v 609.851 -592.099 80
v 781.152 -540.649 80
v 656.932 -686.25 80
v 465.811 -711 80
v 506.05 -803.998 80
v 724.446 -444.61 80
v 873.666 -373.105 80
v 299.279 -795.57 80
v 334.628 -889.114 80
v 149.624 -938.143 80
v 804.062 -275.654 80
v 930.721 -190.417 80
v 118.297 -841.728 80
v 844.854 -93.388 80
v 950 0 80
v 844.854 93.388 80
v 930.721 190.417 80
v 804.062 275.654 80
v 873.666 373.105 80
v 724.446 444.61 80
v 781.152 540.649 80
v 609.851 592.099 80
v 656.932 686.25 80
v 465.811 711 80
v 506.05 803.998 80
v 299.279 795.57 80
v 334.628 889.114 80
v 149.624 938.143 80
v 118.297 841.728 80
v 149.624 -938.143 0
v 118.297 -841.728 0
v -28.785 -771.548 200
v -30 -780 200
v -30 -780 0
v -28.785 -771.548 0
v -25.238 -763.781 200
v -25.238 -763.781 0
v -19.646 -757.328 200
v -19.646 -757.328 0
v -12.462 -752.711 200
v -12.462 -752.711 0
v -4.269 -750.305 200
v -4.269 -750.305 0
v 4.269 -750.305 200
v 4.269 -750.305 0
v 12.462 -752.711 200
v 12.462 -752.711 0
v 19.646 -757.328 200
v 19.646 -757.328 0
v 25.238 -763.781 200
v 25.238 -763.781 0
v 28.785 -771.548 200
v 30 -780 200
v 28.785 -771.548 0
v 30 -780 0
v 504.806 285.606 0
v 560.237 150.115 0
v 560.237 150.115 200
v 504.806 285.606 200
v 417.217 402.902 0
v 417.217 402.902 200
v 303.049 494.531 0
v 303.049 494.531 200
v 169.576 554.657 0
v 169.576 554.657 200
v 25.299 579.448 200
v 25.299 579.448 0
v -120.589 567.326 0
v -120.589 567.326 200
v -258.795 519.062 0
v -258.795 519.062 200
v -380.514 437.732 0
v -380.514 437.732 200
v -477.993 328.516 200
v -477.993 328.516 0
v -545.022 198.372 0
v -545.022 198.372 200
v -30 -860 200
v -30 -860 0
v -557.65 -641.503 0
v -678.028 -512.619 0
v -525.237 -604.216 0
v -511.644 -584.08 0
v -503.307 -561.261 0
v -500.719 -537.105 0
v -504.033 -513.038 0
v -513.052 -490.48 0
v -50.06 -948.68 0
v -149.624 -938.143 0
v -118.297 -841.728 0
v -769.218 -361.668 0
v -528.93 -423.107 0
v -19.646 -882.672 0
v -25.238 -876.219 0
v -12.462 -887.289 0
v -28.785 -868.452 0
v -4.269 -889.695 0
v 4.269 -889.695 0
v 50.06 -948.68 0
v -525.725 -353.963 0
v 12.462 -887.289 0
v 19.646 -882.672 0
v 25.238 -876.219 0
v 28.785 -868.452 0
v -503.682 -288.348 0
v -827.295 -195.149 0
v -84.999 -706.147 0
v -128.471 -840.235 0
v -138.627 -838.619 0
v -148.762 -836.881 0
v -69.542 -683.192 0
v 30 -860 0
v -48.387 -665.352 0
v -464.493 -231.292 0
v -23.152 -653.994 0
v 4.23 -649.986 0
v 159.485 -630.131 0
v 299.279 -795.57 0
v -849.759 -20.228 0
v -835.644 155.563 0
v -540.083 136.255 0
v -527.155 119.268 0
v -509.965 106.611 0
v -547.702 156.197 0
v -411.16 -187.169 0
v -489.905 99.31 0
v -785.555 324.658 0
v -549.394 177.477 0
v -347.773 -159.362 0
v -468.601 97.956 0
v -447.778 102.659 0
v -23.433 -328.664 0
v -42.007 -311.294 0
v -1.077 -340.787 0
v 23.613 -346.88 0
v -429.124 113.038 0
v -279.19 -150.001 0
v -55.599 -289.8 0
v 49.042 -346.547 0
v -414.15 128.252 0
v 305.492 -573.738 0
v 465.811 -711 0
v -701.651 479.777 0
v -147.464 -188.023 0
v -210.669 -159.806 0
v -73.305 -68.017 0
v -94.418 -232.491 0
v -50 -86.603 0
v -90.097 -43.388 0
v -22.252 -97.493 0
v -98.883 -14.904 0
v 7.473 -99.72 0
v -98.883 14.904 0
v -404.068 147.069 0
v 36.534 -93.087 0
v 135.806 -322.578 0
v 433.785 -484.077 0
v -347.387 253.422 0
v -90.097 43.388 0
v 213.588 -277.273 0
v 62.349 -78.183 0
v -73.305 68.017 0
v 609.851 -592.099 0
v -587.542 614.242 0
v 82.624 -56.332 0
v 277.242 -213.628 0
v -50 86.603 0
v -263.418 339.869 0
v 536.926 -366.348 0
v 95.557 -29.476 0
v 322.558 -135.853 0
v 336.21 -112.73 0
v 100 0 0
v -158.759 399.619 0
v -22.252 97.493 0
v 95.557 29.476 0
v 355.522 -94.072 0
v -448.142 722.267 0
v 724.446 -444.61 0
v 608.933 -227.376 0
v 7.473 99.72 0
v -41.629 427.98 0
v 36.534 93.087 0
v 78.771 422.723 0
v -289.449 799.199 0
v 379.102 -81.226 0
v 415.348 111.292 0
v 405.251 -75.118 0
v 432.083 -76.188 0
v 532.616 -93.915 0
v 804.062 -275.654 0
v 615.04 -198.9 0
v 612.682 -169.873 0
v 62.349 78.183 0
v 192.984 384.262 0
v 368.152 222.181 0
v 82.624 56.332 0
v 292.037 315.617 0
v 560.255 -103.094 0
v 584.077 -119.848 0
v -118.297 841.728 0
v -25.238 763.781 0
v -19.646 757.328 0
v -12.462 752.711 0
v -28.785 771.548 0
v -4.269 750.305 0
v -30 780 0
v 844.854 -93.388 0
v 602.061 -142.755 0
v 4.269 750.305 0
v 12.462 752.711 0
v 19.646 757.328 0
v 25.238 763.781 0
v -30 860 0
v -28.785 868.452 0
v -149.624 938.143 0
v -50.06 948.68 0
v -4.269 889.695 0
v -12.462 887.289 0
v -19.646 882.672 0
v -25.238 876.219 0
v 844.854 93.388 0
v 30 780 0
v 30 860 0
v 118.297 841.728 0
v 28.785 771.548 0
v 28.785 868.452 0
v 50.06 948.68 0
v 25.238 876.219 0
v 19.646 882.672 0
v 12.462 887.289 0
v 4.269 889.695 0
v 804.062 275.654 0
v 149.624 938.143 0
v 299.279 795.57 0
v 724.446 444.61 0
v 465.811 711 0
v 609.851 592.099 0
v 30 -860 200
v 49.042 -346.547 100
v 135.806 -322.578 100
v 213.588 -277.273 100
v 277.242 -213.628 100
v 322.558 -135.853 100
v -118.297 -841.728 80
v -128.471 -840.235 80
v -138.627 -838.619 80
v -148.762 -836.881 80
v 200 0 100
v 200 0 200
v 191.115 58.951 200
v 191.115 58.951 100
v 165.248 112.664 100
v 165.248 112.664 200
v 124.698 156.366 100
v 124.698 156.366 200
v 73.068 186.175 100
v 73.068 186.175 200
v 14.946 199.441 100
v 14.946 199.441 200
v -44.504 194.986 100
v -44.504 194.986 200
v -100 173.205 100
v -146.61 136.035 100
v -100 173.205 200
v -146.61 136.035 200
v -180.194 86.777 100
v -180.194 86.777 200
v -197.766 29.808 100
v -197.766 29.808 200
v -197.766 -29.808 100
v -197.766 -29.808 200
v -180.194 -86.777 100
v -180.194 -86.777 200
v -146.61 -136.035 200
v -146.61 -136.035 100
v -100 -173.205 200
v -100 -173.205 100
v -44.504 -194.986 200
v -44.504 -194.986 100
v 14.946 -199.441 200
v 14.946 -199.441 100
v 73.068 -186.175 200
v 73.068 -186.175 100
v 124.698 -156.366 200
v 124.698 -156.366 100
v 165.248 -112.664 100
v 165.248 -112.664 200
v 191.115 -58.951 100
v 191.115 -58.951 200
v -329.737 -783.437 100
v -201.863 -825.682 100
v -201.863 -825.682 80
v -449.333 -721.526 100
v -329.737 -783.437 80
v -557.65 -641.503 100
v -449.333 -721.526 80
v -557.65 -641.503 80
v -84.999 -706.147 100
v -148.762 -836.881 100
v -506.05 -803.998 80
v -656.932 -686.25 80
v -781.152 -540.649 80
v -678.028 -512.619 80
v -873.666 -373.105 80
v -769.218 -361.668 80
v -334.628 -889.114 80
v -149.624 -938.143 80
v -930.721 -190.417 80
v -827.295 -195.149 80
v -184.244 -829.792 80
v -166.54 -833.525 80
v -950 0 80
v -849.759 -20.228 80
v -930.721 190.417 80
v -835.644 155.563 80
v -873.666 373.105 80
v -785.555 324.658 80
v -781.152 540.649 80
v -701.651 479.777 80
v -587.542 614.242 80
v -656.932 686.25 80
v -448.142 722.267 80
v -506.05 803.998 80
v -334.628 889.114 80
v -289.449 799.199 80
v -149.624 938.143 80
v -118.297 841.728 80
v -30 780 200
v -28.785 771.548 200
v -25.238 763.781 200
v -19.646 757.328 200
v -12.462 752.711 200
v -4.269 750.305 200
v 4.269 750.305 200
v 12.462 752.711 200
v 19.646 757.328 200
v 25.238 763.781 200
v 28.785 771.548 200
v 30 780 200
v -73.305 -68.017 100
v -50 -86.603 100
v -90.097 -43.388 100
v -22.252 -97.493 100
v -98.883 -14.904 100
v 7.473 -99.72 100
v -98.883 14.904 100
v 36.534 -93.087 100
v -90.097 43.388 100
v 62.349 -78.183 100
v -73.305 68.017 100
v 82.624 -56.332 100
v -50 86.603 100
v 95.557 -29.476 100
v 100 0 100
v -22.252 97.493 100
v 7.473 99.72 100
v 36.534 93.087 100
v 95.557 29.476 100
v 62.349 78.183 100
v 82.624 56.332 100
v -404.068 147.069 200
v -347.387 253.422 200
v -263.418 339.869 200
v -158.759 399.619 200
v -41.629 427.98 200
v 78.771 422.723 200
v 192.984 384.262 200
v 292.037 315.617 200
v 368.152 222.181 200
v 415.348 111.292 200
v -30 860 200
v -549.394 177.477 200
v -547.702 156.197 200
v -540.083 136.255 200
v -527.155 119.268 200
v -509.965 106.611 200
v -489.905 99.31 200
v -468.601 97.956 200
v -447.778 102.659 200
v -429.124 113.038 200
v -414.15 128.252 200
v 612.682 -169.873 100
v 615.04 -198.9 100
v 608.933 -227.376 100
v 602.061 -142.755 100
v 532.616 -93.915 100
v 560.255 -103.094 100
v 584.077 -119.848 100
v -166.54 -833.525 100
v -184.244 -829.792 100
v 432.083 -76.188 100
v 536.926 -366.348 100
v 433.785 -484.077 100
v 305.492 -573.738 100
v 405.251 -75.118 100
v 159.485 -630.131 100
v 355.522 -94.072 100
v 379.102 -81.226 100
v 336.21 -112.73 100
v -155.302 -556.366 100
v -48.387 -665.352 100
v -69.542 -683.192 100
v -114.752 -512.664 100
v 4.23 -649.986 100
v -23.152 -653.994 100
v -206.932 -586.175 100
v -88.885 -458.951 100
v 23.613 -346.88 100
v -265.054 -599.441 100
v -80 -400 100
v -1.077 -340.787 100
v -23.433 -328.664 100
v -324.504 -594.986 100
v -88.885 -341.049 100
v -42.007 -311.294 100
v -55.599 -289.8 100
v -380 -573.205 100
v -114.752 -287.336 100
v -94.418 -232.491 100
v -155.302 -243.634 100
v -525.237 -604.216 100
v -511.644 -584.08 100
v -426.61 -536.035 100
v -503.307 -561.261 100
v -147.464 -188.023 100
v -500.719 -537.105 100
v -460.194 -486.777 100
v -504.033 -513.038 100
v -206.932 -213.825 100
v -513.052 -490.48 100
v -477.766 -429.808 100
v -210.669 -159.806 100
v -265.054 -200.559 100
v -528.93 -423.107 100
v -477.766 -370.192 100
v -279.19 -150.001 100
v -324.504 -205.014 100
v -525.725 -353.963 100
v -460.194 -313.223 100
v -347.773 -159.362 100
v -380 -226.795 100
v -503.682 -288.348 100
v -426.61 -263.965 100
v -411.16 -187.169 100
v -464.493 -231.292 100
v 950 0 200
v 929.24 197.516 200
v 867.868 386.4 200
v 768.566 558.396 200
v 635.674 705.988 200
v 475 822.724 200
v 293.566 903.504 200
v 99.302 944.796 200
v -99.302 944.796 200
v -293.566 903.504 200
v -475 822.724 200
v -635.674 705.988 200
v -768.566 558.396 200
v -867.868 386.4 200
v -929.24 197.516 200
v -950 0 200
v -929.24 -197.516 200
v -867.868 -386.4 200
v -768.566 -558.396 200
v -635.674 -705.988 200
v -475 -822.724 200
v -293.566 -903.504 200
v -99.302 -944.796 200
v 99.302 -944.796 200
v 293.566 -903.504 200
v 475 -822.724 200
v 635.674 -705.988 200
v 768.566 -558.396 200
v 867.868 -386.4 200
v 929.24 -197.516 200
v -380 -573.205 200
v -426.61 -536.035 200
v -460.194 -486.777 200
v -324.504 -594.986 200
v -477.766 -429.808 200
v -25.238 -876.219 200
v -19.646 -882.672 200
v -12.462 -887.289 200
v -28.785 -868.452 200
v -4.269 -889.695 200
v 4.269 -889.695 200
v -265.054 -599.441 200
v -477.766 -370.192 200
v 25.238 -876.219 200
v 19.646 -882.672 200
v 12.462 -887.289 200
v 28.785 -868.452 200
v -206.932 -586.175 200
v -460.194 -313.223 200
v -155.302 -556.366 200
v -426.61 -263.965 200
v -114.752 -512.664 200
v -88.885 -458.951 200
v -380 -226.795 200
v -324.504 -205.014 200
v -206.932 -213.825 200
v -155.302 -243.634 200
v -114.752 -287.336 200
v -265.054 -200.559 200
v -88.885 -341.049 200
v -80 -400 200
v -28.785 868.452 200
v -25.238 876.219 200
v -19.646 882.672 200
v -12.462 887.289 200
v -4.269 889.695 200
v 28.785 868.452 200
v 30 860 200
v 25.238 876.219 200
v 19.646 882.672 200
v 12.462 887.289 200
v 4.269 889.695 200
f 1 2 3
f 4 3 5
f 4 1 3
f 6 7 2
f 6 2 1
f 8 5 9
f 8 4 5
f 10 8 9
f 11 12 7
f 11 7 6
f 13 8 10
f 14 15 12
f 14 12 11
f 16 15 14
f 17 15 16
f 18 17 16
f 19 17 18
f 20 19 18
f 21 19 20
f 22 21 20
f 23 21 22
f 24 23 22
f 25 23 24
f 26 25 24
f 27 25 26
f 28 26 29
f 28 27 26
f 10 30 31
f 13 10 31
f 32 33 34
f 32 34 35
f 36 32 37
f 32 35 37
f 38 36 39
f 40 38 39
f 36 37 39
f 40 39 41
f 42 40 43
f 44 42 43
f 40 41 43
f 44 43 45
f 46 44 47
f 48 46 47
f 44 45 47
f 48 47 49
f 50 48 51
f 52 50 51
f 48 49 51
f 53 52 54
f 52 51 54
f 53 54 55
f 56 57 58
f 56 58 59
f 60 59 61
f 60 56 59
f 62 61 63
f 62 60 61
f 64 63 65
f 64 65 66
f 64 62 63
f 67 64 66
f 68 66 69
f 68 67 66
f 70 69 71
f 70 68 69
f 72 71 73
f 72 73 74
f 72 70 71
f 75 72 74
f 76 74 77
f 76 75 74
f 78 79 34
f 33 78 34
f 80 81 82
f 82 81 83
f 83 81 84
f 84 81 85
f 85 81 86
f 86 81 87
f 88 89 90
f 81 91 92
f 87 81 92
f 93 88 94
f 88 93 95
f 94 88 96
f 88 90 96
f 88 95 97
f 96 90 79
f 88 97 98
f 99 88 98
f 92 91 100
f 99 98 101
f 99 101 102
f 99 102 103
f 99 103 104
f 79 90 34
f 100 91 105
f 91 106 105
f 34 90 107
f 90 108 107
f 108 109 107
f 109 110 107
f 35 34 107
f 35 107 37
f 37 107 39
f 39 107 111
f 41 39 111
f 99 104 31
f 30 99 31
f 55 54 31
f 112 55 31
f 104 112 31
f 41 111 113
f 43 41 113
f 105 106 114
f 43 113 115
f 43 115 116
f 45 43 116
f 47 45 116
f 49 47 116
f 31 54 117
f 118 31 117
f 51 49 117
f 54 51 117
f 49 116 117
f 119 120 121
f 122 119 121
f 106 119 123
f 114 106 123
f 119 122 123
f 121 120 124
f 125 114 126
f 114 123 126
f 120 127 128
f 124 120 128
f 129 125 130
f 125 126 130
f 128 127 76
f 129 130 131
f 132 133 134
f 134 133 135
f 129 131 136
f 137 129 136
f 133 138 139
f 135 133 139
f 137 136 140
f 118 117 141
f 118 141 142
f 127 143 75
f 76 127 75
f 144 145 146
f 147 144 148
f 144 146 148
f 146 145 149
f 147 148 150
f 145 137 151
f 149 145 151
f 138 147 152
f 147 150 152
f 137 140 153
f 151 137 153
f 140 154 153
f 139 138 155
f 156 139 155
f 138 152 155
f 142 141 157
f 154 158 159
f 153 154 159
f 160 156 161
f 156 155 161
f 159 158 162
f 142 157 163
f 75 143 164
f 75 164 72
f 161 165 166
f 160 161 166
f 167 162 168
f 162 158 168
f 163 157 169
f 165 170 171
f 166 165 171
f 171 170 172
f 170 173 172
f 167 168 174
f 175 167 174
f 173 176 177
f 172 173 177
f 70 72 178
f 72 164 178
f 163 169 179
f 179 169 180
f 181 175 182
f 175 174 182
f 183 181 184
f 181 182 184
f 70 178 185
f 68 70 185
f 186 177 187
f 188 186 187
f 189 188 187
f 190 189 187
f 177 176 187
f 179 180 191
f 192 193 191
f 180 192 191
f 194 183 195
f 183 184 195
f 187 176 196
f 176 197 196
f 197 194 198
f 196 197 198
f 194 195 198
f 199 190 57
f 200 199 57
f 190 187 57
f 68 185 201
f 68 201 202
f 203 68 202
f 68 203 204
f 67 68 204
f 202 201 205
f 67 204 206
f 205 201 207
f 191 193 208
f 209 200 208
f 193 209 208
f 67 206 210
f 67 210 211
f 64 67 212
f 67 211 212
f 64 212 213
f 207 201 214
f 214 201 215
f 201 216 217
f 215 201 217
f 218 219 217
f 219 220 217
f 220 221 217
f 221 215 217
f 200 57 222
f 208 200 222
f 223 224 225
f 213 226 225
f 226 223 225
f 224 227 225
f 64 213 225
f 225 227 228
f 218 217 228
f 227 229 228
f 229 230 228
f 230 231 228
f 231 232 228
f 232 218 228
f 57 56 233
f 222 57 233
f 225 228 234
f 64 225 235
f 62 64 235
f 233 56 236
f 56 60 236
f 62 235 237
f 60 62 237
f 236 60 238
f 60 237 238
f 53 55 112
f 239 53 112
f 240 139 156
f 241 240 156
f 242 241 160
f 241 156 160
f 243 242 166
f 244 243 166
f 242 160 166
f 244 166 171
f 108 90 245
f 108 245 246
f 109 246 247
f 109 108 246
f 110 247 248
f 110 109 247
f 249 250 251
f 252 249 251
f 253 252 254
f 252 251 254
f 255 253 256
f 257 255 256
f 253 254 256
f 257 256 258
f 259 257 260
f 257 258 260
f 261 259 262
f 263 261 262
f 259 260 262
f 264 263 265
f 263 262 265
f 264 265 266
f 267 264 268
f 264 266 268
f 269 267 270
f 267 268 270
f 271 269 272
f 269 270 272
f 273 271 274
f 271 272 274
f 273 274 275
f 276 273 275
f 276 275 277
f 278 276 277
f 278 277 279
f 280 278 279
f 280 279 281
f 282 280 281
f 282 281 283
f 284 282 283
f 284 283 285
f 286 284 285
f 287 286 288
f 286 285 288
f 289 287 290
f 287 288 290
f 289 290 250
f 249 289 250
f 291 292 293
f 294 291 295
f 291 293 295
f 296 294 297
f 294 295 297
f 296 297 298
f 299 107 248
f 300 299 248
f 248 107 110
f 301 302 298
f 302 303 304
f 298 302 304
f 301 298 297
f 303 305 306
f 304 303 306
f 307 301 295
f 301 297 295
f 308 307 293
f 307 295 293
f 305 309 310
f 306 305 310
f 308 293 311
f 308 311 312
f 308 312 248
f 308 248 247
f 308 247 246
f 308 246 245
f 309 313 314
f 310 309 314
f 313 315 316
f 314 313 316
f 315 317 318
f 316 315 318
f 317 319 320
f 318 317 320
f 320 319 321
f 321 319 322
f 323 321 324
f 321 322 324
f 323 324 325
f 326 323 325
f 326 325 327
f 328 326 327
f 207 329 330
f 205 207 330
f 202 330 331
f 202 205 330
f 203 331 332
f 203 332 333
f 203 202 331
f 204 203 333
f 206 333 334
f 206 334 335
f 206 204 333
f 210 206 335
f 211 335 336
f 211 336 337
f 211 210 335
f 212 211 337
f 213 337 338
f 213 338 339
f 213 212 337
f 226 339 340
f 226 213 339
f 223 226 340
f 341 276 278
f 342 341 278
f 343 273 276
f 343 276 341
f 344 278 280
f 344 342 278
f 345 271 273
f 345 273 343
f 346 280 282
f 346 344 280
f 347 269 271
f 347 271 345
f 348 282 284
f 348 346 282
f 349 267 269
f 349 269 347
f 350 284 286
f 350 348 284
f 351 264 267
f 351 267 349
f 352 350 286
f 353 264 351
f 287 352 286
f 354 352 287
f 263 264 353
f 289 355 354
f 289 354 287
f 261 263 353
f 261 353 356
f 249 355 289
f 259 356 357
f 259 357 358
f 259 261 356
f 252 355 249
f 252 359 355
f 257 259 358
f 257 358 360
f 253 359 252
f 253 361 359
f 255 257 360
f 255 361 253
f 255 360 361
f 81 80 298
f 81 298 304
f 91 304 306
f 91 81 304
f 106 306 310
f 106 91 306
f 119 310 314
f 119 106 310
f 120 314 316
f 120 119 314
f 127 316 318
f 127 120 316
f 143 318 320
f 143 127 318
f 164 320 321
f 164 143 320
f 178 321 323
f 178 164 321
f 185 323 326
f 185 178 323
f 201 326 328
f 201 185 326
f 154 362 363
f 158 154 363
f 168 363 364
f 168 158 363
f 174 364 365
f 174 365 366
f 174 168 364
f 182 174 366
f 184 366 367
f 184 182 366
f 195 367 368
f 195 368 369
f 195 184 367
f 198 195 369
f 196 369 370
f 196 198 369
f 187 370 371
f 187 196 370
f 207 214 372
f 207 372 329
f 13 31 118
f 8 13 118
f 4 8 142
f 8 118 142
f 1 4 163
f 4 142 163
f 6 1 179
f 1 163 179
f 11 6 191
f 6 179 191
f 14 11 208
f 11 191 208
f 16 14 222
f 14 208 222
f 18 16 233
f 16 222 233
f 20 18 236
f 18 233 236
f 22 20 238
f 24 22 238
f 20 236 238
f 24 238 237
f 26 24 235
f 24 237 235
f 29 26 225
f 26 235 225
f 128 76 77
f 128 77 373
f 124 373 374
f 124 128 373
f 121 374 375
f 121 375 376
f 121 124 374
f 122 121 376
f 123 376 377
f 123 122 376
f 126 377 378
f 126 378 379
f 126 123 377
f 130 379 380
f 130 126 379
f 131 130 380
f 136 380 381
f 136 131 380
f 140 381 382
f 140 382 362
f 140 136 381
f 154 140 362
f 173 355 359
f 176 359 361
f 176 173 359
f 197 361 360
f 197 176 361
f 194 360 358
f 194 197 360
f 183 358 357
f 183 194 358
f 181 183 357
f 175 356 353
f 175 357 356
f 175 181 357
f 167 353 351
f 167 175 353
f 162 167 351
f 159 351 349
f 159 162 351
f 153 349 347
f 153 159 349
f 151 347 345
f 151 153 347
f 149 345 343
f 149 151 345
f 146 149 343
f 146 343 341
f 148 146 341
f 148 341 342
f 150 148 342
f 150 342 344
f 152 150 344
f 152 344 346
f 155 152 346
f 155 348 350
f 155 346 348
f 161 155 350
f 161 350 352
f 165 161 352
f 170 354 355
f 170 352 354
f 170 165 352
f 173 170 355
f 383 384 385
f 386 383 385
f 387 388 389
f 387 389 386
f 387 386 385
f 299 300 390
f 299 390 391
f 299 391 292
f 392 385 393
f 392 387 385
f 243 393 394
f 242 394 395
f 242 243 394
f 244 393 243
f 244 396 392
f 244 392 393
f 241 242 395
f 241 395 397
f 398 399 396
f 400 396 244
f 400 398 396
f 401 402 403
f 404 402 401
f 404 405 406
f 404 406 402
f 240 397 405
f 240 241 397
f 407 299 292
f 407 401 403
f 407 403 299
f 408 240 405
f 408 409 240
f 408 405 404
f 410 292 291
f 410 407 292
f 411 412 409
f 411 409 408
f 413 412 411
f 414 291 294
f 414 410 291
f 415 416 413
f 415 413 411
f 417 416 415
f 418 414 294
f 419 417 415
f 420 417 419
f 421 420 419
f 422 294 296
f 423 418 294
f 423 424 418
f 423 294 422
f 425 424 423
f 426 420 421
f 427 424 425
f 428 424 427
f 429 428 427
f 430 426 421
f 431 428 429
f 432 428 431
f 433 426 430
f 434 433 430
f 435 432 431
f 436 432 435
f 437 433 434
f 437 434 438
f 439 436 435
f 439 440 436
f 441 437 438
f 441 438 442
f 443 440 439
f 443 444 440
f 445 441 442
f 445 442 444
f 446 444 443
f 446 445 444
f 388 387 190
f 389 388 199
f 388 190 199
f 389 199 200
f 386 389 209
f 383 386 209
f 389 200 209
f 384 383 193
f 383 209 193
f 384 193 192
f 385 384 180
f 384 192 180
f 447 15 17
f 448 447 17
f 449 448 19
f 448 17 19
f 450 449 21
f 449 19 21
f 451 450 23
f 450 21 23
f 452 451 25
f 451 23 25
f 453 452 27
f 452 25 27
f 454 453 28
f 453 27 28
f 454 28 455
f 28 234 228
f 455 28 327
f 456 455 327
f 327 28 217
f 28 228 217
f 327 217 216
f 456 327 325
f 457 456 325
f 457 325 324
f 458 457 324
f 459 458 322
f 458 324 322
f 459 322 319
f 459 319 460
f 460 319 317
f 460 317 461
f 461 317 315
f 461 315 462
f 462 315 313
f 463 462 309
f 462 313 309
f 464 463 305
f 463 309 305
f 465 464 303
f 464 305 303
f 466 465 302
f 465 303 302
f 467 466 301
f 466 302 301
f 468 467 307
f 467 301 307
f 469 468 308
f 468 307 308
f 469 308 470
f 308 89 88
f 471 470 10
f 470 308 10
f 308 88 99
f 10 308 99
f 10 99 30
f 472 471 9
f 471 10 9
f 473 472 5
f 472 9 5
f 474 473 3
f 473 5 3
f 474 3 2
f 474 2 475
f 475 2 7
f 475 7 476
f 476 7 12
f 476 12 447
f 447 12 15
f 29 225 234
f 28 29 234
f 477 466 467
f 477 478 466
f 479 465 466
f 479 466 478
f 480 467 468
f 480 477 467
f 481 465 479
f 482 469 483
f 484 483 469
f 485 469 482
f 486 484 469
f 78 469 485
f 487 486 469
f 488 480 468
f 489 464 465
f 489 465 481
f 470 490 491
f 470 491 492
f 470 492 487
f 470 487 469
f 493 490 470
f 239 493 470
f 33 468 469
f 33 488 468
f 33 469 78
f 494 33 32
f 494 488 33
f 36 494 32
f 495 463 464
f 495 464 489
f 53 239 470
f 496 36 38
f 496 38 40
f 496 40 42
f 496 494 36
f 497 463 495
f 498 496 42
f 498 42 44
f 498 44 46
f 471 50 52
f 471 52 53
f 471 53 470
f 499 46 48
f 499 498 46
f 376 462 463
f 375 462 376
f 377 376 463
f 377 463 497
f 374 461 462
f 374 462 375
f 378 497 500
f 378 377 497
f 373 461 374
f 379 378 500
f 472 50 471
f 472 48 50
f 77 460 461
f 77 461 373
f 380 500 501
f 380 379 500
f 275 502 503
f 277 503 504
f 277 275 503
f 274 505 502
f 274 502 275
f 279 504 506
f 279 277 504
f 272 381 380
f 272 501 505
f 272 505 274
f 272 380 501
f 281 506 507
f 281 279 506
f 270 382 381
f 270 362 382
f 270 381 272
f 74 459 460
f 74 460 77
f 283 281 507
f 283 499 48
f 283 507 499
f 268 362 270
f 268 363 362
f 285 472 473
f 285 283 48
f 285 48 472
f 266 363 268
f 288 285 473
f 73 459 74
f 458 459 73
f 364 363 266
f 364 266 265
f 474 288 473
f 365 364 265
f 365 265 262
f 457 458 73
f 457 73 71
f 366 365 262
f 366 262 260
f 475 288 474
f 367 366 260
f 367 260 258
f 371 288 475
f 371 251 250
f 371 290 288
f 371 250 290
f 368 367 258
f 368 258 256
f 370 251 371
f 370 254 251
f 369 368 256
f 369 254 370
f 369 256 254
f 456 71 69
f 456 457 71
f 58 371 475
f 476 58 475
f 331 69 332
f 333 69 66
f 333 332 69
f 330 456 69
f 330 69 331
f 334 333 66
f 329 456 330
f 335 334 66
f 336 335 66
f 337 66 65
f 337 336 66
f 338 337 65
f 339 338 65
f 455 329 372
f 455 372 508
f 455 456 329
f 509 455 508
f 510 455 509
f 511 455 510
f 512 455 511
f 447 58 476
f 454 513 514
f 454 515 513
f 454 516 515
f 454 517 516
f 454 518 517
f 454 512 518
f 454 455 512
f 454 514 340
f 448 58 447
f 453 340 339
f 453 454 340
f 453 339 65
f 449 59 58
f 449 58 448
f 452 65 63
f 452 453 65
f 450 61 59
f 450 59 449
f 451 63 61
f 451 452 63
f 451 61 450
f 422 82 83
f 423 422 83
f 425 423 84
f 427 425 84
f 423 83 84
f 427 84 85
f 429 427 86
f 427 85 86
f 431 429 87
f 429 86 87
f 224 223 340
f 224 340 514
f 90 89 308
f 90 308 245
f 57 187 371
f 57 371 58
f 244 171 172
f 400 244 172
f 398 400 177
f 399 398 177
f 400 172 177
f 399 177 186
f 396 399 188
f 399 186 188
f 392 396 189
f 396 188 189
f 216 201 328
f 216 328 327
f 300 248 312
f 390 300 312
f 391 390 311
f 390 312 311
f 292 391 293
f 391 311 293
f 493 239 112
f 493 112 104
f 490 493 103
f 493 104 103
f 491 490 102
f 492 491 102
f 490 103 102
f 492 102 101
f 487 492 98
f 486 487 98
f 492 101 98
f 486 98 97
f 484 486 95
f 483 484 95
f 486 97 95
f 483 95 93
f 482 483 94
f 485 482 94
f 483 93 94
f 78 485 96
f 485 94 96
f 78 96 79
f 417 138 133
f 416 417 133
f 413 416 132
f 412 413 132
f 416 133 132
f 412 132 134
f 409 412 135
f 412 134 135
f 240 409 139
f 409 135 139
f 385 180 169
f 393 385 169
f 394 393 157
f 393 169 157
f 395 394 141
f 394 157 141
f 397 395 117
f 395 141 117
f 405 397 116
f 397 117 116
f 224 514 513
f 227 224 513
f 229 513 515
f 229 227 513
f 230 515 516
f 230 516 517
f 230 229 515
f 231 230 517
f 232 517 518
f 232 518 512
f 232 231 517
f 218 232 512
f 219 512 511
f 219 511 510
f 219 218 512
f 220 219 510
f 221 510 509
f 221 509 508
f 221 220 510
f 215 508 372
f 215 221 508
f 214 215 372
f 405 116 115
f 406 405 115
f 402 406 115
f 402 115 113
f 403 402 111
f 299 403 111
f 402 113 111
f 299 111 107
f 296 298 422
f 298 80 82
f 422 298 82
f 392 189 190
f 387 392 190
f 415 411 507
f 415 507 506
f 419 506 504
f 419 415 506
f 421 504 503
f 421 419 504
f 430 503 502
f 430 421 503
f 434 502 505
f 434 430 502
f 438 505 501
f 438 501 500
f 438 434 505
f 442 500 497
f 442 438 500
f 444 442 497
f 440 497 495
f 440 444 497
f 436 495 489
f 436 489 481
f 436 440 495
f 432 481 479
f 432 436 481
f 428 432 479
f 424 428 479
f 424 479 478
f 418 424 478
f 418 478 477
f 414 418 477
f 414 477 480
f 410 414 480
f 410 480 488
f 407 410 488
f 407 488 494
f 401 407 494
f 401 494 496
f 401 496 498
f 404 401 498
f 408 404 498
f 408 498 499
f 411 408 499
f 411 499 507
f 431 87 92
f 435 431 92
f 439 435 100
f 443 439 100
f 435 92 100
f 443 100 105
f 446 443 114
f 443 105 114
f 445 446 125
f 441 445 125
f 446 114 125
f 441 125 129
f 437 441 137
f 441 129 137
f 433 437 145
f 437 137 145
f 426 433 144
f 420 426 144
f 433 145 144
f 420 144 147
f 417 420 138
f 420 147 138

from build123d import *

# Parameters (mm, degrees)
ESQUISSE1_R             = 950
ESQUISSE1_R_2           = 100
ESQUISSE1_R_3           = 200
BOSS_EXTRU_2_DEPTH      = 200
ESQUISSE4_R             = 200
ENL_V_MAT_EXTRU_2_DEPTH = 100
ESQUISSE5_R             = 200
ENL_V_MAT_EXTRU_3_DEPTH = 100
ENL_V_MAT_EXTRU_4_DEPTH = 80


with BuildPart() as part:
    # Esquisse1 → Boss.-Extru.2 (new body)
    with BuildSketch(Plane.XY):
        Circle(ESQUISSE1_R)
        Circle(ESQUISSE1_R_2, mode=Mode.SUBTRACT)
        with Locations((-280, -400)):
            Circle(ESQUISSE1_R_3, mode=Mode.SUBTRACT)
        with BuildLine():
            Line((30, -780), (30, -860))
            ThreePointArc((30, -860), (0, -890), (-30, -860))
            Line((-30, -860), (-30, -780))
            ThreePointArc((-30, -780), (0, -750), (30, -780))
        make_face(mode=Mode.SUBTRACT)
        with BuildLine():
            Line((415.348105304, 111.292189394), (560.236979248, 150.115046159))
            ThreePointArc((560.236979248, 150.115046159), (25.299244672, 579.447968517), (-545.021720056, 198.371683129))
            ThreePointArc((-545.021720056, 198.371683129), (-500.196284246, 102.243225821), (-404.067826938, 147.06866163))
            ThreePointArc((-404.067826938, 147.06866163), (18.756336567, 429.59073528), (415.348105304, 111.292189394))
        make_face(mode=Mode.SUBTRACT)
        with BuildLine():
            Line((30, 780), (30, 860))
            ThreePointArc((30, 860), (0, 890), (-30, 860))
            Line((-30, 860), (-30, 780))
            ThreePointArc((-30, 780), (0, 750), (30, 780))
        make_face(mode=Mode.SUBTRACT)
    extrude(amount=BOSS_EXTRU_2_DEPTH)

    # Esquisse4 → Enlèv. mat.-Extru.2 (cut)
    with BuildSketch(Plane.XY.offset(200)):
        Circle(ESQUISSE4_R)
    extrude(amount=-ENL_V_MAT_EXTRU_2_DEPTH, mode=Mode.SUBTRACT)

    # Esquisse5 → Enlèv. mat.-Extru.3 (cut)
    with BuildSketch(Plane(origin=(0, 0, 0), x_dir=(-1, 0, 0), z_dir=(0, 0, -1))):
        with BuildLine():
            ThreePointArc((201.863253444, -825.682279638), (390.762908215, -754.853859739), (557.650174642, -641.503143189))
            Line((557.650174642, -641.503143189), (525.236890093, -604.21592467))
            ThreePointArc((525.236890093, -604.21592467), (501.276797335, -549.262070437), (513.052344937, -490.479856982))
            ThreePointArc((513.052344937, -490.479856982), (380.433331839, -171.060824987), (55.598868761, -289.799581223))
            ThreePointArc((55.598868761, -289.799581223), (12.641866668, -335.439232515), (-49.041983374, -346.547087517))
            ThreePointArc((-49.041983374, -346.547087517), (-213.58758579, -277.273048088), (-322.558312447, -135.853358705))
            ThreePointArc((-322.558312447, -135.853358705), (-366.878979382, -86.853774186), (-432.082648055, -76.187828748))
            Line((-432.082648055, -76.187828748), (-532.616227494, -93.91461127))
            ThreePointArc((-532.616227494, -93.91461127), (-602.060758652, -142.755312647), (-608.933484223, -227.376365948))
            ThreePointArc((-608.933484223, -227.376365948), (-372.346828507, -532.783107184), (-4.23006723, -649.986235648))
            ThreePointArc((-4.23006723, -649.986235648), (48.386746731, -665.352188625), (84.998557826, -706.147003376))
            Line((84.998557826, -706.147003376), (148.761821167, -836.881067155))
            ThreePointArc((148.761821167, -836.881067155), (175.401935414, -831.705573537), (201.863253444, -825.682279638))
        make_face()
        with Locations((280, -400)):
            Circle(ESQUISSE5_R, mode=Mode.SUBTRACT)
    extrude(amount=-ENL_V_MAT_EXTRU_3_DEPTH, mode=Mode.SUBTRACT)

    # Esquisse6 → Enlèv. mat.-Extru.4 (cut)
    with BuildSketch(Plane(origin=(0, 0, 0), x_dir=(-1, 0, 0), z_dir=(0, 0, -1))):
        with BuildLine():
            Line((-118.297135816, 841.72785843), (-149.624359786, 938.143139909))
            ThreePointArc((-149.624359786, 938.143139909), (-950, 0), (-149.624359786, -938.143139909))
            Line((-149.624359786, -938.143139909), (-118.297135816, -841.72785843))
            ThreePointArc((-118.297135816, -841.72785843), (-850, 0), (-118.297135816, 841.72785843))
        make_face()
        with BuildLine():
            Line((118.297135816, 841.72785843), (149.624359786, 938.143139909))
            ThreePointArc((149.624359786, 938.143139909), (950, 0), (149.624359786, -938.143139909))
            Line((149.624359786, -938.143139909), (118.297135816, -841.72785843))
            ThreePointArc((118.297135816, -841.72785843), (850, 0), (118.297135816, 841.72785843))
        make_face()
    extrude(amount=-ENL_V_MAT_EXTRU_4_DEPTH, mode=Mode.SUBTRACT)


solid = part.part
